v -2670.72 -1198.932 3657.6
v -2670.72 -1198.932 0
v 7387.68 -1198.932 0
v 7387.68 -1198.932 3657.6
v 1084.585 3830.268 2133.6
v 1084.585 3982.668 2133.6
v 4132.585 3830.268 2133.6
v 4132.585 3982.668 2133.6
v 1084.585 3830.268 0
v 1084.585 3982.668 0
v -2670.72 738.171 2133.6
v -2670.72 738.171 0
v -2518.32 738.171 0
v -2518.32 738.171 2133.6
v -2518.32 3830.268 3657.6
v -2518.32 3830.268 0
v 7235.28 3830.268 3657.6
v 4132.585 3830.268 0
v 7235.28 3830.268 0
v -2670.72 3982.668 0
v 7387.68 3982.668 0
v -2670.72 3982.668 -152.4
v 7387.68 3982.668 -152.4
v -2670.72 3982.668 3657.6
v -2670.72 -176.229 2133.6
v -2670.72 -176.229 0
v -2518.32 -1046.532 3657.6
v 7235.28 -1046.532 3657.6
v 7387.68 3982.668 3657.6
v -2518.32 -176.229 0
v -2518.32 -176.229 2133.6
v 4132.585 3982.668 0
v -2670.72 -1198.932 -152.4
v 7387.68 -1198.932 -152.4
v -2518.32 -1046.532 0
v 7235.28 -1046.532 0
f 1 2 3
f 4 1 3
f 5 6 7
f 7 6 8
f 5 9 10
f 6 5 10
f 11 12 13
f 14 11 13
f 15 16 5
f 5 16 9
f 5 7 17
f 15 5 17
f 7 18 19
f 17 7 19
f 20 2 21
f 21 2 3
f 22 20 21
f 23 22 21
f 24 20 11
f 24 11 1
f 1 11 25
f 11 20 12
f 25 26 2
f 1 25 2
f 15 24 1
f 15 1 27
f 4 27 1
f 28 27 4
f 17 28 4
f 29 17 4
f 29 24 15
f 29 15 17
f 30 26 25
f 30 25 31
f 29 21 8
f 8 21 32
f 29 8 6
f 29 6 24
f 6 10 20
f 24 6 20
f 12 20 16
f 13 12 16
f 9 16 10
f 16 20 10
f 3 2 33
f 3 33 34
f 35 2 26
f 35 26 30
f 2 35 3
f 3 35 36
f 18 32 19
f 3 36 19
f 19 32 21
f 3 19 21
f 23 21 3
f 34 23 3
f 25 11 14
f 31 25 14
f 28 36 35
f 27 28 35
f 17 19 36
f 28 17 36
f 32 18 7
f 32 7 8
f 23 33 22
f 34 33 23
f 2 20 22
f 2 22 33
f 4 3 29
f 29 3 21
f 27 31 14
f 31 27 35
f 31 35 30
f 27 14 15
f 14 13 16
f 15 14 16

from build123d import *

# Parameters (mm, degrees)
F0_W     = 3048
F0_H     = 152.4
F0_W_2   = 152.4
F0_H_2   = 914.4
F1_DEPTH = 3657.6
F2_DEPTH = 2133.6
F3_W     = 10058.4
F3_H     = 5181.6
F4_DEPTH = 152.4


with BuildPart() as f1:
    # F0 (on Top) → F1 (new body)
    with BuildSketch(Plane.XY):
        Polygon((-2518.320339, 738.170896), (-2518.320339, 3830.268445), (1084.585428, 3830.268445), (1084.585428, 3982.668445), (-2670.720339, 3982.668445), (-2670.720339, 738.170896), align=None)
        with Locations((2608.585428, 3906.468445)):
            Rectangle(F0_W, F0_H)
        with Locations((-2594.520339, 280.970896)):
            Rectangle(F0_W_2, F0_H_2)
        Polygon((4132.585428, 3982.668445), (4132.585428, 3830.268445), (7235.279661, 3830.268445), (7235.279661, -1046.531555), (-2518.320339, -1046.531555), (-2518.320339, -176.229104), (-2670.720339, -176.229104), (-2670.720339, -1198.931555), (7387.679661, -1198.931555), (7387.679661, 3982.668445), align=None)
    extrude(amount=F1_DEPTH)

    # F0 (on Top) → F2 (cut)
    with BuildSketch(Plane.XY):
        with Locations((2608.585428, 3906.468445)):
            Rectangle(F0_W, F0_H)
        with Locations((-2594.520339, 280.970896)):
            Rectangle(F0_W_2, F0_H_2)
    extrude(amount=F2_DEPTH, mode=Mode.SUBTRACT)


with BuildPart() as f4:
    # F3 (on face) → F4 (new body)
    with BuildSketch(Plane(origin=(0, 0, 0), x_dir=(1, 0, 0), z_dir=(0, 0, -1))):
        with Locations((2358.479661, -1391.868445)):
            Rectangle(F3_W, F3_H)
    extrude(amount=F4_DEPTH)


solid = Compound([f1.part, f4.part])
